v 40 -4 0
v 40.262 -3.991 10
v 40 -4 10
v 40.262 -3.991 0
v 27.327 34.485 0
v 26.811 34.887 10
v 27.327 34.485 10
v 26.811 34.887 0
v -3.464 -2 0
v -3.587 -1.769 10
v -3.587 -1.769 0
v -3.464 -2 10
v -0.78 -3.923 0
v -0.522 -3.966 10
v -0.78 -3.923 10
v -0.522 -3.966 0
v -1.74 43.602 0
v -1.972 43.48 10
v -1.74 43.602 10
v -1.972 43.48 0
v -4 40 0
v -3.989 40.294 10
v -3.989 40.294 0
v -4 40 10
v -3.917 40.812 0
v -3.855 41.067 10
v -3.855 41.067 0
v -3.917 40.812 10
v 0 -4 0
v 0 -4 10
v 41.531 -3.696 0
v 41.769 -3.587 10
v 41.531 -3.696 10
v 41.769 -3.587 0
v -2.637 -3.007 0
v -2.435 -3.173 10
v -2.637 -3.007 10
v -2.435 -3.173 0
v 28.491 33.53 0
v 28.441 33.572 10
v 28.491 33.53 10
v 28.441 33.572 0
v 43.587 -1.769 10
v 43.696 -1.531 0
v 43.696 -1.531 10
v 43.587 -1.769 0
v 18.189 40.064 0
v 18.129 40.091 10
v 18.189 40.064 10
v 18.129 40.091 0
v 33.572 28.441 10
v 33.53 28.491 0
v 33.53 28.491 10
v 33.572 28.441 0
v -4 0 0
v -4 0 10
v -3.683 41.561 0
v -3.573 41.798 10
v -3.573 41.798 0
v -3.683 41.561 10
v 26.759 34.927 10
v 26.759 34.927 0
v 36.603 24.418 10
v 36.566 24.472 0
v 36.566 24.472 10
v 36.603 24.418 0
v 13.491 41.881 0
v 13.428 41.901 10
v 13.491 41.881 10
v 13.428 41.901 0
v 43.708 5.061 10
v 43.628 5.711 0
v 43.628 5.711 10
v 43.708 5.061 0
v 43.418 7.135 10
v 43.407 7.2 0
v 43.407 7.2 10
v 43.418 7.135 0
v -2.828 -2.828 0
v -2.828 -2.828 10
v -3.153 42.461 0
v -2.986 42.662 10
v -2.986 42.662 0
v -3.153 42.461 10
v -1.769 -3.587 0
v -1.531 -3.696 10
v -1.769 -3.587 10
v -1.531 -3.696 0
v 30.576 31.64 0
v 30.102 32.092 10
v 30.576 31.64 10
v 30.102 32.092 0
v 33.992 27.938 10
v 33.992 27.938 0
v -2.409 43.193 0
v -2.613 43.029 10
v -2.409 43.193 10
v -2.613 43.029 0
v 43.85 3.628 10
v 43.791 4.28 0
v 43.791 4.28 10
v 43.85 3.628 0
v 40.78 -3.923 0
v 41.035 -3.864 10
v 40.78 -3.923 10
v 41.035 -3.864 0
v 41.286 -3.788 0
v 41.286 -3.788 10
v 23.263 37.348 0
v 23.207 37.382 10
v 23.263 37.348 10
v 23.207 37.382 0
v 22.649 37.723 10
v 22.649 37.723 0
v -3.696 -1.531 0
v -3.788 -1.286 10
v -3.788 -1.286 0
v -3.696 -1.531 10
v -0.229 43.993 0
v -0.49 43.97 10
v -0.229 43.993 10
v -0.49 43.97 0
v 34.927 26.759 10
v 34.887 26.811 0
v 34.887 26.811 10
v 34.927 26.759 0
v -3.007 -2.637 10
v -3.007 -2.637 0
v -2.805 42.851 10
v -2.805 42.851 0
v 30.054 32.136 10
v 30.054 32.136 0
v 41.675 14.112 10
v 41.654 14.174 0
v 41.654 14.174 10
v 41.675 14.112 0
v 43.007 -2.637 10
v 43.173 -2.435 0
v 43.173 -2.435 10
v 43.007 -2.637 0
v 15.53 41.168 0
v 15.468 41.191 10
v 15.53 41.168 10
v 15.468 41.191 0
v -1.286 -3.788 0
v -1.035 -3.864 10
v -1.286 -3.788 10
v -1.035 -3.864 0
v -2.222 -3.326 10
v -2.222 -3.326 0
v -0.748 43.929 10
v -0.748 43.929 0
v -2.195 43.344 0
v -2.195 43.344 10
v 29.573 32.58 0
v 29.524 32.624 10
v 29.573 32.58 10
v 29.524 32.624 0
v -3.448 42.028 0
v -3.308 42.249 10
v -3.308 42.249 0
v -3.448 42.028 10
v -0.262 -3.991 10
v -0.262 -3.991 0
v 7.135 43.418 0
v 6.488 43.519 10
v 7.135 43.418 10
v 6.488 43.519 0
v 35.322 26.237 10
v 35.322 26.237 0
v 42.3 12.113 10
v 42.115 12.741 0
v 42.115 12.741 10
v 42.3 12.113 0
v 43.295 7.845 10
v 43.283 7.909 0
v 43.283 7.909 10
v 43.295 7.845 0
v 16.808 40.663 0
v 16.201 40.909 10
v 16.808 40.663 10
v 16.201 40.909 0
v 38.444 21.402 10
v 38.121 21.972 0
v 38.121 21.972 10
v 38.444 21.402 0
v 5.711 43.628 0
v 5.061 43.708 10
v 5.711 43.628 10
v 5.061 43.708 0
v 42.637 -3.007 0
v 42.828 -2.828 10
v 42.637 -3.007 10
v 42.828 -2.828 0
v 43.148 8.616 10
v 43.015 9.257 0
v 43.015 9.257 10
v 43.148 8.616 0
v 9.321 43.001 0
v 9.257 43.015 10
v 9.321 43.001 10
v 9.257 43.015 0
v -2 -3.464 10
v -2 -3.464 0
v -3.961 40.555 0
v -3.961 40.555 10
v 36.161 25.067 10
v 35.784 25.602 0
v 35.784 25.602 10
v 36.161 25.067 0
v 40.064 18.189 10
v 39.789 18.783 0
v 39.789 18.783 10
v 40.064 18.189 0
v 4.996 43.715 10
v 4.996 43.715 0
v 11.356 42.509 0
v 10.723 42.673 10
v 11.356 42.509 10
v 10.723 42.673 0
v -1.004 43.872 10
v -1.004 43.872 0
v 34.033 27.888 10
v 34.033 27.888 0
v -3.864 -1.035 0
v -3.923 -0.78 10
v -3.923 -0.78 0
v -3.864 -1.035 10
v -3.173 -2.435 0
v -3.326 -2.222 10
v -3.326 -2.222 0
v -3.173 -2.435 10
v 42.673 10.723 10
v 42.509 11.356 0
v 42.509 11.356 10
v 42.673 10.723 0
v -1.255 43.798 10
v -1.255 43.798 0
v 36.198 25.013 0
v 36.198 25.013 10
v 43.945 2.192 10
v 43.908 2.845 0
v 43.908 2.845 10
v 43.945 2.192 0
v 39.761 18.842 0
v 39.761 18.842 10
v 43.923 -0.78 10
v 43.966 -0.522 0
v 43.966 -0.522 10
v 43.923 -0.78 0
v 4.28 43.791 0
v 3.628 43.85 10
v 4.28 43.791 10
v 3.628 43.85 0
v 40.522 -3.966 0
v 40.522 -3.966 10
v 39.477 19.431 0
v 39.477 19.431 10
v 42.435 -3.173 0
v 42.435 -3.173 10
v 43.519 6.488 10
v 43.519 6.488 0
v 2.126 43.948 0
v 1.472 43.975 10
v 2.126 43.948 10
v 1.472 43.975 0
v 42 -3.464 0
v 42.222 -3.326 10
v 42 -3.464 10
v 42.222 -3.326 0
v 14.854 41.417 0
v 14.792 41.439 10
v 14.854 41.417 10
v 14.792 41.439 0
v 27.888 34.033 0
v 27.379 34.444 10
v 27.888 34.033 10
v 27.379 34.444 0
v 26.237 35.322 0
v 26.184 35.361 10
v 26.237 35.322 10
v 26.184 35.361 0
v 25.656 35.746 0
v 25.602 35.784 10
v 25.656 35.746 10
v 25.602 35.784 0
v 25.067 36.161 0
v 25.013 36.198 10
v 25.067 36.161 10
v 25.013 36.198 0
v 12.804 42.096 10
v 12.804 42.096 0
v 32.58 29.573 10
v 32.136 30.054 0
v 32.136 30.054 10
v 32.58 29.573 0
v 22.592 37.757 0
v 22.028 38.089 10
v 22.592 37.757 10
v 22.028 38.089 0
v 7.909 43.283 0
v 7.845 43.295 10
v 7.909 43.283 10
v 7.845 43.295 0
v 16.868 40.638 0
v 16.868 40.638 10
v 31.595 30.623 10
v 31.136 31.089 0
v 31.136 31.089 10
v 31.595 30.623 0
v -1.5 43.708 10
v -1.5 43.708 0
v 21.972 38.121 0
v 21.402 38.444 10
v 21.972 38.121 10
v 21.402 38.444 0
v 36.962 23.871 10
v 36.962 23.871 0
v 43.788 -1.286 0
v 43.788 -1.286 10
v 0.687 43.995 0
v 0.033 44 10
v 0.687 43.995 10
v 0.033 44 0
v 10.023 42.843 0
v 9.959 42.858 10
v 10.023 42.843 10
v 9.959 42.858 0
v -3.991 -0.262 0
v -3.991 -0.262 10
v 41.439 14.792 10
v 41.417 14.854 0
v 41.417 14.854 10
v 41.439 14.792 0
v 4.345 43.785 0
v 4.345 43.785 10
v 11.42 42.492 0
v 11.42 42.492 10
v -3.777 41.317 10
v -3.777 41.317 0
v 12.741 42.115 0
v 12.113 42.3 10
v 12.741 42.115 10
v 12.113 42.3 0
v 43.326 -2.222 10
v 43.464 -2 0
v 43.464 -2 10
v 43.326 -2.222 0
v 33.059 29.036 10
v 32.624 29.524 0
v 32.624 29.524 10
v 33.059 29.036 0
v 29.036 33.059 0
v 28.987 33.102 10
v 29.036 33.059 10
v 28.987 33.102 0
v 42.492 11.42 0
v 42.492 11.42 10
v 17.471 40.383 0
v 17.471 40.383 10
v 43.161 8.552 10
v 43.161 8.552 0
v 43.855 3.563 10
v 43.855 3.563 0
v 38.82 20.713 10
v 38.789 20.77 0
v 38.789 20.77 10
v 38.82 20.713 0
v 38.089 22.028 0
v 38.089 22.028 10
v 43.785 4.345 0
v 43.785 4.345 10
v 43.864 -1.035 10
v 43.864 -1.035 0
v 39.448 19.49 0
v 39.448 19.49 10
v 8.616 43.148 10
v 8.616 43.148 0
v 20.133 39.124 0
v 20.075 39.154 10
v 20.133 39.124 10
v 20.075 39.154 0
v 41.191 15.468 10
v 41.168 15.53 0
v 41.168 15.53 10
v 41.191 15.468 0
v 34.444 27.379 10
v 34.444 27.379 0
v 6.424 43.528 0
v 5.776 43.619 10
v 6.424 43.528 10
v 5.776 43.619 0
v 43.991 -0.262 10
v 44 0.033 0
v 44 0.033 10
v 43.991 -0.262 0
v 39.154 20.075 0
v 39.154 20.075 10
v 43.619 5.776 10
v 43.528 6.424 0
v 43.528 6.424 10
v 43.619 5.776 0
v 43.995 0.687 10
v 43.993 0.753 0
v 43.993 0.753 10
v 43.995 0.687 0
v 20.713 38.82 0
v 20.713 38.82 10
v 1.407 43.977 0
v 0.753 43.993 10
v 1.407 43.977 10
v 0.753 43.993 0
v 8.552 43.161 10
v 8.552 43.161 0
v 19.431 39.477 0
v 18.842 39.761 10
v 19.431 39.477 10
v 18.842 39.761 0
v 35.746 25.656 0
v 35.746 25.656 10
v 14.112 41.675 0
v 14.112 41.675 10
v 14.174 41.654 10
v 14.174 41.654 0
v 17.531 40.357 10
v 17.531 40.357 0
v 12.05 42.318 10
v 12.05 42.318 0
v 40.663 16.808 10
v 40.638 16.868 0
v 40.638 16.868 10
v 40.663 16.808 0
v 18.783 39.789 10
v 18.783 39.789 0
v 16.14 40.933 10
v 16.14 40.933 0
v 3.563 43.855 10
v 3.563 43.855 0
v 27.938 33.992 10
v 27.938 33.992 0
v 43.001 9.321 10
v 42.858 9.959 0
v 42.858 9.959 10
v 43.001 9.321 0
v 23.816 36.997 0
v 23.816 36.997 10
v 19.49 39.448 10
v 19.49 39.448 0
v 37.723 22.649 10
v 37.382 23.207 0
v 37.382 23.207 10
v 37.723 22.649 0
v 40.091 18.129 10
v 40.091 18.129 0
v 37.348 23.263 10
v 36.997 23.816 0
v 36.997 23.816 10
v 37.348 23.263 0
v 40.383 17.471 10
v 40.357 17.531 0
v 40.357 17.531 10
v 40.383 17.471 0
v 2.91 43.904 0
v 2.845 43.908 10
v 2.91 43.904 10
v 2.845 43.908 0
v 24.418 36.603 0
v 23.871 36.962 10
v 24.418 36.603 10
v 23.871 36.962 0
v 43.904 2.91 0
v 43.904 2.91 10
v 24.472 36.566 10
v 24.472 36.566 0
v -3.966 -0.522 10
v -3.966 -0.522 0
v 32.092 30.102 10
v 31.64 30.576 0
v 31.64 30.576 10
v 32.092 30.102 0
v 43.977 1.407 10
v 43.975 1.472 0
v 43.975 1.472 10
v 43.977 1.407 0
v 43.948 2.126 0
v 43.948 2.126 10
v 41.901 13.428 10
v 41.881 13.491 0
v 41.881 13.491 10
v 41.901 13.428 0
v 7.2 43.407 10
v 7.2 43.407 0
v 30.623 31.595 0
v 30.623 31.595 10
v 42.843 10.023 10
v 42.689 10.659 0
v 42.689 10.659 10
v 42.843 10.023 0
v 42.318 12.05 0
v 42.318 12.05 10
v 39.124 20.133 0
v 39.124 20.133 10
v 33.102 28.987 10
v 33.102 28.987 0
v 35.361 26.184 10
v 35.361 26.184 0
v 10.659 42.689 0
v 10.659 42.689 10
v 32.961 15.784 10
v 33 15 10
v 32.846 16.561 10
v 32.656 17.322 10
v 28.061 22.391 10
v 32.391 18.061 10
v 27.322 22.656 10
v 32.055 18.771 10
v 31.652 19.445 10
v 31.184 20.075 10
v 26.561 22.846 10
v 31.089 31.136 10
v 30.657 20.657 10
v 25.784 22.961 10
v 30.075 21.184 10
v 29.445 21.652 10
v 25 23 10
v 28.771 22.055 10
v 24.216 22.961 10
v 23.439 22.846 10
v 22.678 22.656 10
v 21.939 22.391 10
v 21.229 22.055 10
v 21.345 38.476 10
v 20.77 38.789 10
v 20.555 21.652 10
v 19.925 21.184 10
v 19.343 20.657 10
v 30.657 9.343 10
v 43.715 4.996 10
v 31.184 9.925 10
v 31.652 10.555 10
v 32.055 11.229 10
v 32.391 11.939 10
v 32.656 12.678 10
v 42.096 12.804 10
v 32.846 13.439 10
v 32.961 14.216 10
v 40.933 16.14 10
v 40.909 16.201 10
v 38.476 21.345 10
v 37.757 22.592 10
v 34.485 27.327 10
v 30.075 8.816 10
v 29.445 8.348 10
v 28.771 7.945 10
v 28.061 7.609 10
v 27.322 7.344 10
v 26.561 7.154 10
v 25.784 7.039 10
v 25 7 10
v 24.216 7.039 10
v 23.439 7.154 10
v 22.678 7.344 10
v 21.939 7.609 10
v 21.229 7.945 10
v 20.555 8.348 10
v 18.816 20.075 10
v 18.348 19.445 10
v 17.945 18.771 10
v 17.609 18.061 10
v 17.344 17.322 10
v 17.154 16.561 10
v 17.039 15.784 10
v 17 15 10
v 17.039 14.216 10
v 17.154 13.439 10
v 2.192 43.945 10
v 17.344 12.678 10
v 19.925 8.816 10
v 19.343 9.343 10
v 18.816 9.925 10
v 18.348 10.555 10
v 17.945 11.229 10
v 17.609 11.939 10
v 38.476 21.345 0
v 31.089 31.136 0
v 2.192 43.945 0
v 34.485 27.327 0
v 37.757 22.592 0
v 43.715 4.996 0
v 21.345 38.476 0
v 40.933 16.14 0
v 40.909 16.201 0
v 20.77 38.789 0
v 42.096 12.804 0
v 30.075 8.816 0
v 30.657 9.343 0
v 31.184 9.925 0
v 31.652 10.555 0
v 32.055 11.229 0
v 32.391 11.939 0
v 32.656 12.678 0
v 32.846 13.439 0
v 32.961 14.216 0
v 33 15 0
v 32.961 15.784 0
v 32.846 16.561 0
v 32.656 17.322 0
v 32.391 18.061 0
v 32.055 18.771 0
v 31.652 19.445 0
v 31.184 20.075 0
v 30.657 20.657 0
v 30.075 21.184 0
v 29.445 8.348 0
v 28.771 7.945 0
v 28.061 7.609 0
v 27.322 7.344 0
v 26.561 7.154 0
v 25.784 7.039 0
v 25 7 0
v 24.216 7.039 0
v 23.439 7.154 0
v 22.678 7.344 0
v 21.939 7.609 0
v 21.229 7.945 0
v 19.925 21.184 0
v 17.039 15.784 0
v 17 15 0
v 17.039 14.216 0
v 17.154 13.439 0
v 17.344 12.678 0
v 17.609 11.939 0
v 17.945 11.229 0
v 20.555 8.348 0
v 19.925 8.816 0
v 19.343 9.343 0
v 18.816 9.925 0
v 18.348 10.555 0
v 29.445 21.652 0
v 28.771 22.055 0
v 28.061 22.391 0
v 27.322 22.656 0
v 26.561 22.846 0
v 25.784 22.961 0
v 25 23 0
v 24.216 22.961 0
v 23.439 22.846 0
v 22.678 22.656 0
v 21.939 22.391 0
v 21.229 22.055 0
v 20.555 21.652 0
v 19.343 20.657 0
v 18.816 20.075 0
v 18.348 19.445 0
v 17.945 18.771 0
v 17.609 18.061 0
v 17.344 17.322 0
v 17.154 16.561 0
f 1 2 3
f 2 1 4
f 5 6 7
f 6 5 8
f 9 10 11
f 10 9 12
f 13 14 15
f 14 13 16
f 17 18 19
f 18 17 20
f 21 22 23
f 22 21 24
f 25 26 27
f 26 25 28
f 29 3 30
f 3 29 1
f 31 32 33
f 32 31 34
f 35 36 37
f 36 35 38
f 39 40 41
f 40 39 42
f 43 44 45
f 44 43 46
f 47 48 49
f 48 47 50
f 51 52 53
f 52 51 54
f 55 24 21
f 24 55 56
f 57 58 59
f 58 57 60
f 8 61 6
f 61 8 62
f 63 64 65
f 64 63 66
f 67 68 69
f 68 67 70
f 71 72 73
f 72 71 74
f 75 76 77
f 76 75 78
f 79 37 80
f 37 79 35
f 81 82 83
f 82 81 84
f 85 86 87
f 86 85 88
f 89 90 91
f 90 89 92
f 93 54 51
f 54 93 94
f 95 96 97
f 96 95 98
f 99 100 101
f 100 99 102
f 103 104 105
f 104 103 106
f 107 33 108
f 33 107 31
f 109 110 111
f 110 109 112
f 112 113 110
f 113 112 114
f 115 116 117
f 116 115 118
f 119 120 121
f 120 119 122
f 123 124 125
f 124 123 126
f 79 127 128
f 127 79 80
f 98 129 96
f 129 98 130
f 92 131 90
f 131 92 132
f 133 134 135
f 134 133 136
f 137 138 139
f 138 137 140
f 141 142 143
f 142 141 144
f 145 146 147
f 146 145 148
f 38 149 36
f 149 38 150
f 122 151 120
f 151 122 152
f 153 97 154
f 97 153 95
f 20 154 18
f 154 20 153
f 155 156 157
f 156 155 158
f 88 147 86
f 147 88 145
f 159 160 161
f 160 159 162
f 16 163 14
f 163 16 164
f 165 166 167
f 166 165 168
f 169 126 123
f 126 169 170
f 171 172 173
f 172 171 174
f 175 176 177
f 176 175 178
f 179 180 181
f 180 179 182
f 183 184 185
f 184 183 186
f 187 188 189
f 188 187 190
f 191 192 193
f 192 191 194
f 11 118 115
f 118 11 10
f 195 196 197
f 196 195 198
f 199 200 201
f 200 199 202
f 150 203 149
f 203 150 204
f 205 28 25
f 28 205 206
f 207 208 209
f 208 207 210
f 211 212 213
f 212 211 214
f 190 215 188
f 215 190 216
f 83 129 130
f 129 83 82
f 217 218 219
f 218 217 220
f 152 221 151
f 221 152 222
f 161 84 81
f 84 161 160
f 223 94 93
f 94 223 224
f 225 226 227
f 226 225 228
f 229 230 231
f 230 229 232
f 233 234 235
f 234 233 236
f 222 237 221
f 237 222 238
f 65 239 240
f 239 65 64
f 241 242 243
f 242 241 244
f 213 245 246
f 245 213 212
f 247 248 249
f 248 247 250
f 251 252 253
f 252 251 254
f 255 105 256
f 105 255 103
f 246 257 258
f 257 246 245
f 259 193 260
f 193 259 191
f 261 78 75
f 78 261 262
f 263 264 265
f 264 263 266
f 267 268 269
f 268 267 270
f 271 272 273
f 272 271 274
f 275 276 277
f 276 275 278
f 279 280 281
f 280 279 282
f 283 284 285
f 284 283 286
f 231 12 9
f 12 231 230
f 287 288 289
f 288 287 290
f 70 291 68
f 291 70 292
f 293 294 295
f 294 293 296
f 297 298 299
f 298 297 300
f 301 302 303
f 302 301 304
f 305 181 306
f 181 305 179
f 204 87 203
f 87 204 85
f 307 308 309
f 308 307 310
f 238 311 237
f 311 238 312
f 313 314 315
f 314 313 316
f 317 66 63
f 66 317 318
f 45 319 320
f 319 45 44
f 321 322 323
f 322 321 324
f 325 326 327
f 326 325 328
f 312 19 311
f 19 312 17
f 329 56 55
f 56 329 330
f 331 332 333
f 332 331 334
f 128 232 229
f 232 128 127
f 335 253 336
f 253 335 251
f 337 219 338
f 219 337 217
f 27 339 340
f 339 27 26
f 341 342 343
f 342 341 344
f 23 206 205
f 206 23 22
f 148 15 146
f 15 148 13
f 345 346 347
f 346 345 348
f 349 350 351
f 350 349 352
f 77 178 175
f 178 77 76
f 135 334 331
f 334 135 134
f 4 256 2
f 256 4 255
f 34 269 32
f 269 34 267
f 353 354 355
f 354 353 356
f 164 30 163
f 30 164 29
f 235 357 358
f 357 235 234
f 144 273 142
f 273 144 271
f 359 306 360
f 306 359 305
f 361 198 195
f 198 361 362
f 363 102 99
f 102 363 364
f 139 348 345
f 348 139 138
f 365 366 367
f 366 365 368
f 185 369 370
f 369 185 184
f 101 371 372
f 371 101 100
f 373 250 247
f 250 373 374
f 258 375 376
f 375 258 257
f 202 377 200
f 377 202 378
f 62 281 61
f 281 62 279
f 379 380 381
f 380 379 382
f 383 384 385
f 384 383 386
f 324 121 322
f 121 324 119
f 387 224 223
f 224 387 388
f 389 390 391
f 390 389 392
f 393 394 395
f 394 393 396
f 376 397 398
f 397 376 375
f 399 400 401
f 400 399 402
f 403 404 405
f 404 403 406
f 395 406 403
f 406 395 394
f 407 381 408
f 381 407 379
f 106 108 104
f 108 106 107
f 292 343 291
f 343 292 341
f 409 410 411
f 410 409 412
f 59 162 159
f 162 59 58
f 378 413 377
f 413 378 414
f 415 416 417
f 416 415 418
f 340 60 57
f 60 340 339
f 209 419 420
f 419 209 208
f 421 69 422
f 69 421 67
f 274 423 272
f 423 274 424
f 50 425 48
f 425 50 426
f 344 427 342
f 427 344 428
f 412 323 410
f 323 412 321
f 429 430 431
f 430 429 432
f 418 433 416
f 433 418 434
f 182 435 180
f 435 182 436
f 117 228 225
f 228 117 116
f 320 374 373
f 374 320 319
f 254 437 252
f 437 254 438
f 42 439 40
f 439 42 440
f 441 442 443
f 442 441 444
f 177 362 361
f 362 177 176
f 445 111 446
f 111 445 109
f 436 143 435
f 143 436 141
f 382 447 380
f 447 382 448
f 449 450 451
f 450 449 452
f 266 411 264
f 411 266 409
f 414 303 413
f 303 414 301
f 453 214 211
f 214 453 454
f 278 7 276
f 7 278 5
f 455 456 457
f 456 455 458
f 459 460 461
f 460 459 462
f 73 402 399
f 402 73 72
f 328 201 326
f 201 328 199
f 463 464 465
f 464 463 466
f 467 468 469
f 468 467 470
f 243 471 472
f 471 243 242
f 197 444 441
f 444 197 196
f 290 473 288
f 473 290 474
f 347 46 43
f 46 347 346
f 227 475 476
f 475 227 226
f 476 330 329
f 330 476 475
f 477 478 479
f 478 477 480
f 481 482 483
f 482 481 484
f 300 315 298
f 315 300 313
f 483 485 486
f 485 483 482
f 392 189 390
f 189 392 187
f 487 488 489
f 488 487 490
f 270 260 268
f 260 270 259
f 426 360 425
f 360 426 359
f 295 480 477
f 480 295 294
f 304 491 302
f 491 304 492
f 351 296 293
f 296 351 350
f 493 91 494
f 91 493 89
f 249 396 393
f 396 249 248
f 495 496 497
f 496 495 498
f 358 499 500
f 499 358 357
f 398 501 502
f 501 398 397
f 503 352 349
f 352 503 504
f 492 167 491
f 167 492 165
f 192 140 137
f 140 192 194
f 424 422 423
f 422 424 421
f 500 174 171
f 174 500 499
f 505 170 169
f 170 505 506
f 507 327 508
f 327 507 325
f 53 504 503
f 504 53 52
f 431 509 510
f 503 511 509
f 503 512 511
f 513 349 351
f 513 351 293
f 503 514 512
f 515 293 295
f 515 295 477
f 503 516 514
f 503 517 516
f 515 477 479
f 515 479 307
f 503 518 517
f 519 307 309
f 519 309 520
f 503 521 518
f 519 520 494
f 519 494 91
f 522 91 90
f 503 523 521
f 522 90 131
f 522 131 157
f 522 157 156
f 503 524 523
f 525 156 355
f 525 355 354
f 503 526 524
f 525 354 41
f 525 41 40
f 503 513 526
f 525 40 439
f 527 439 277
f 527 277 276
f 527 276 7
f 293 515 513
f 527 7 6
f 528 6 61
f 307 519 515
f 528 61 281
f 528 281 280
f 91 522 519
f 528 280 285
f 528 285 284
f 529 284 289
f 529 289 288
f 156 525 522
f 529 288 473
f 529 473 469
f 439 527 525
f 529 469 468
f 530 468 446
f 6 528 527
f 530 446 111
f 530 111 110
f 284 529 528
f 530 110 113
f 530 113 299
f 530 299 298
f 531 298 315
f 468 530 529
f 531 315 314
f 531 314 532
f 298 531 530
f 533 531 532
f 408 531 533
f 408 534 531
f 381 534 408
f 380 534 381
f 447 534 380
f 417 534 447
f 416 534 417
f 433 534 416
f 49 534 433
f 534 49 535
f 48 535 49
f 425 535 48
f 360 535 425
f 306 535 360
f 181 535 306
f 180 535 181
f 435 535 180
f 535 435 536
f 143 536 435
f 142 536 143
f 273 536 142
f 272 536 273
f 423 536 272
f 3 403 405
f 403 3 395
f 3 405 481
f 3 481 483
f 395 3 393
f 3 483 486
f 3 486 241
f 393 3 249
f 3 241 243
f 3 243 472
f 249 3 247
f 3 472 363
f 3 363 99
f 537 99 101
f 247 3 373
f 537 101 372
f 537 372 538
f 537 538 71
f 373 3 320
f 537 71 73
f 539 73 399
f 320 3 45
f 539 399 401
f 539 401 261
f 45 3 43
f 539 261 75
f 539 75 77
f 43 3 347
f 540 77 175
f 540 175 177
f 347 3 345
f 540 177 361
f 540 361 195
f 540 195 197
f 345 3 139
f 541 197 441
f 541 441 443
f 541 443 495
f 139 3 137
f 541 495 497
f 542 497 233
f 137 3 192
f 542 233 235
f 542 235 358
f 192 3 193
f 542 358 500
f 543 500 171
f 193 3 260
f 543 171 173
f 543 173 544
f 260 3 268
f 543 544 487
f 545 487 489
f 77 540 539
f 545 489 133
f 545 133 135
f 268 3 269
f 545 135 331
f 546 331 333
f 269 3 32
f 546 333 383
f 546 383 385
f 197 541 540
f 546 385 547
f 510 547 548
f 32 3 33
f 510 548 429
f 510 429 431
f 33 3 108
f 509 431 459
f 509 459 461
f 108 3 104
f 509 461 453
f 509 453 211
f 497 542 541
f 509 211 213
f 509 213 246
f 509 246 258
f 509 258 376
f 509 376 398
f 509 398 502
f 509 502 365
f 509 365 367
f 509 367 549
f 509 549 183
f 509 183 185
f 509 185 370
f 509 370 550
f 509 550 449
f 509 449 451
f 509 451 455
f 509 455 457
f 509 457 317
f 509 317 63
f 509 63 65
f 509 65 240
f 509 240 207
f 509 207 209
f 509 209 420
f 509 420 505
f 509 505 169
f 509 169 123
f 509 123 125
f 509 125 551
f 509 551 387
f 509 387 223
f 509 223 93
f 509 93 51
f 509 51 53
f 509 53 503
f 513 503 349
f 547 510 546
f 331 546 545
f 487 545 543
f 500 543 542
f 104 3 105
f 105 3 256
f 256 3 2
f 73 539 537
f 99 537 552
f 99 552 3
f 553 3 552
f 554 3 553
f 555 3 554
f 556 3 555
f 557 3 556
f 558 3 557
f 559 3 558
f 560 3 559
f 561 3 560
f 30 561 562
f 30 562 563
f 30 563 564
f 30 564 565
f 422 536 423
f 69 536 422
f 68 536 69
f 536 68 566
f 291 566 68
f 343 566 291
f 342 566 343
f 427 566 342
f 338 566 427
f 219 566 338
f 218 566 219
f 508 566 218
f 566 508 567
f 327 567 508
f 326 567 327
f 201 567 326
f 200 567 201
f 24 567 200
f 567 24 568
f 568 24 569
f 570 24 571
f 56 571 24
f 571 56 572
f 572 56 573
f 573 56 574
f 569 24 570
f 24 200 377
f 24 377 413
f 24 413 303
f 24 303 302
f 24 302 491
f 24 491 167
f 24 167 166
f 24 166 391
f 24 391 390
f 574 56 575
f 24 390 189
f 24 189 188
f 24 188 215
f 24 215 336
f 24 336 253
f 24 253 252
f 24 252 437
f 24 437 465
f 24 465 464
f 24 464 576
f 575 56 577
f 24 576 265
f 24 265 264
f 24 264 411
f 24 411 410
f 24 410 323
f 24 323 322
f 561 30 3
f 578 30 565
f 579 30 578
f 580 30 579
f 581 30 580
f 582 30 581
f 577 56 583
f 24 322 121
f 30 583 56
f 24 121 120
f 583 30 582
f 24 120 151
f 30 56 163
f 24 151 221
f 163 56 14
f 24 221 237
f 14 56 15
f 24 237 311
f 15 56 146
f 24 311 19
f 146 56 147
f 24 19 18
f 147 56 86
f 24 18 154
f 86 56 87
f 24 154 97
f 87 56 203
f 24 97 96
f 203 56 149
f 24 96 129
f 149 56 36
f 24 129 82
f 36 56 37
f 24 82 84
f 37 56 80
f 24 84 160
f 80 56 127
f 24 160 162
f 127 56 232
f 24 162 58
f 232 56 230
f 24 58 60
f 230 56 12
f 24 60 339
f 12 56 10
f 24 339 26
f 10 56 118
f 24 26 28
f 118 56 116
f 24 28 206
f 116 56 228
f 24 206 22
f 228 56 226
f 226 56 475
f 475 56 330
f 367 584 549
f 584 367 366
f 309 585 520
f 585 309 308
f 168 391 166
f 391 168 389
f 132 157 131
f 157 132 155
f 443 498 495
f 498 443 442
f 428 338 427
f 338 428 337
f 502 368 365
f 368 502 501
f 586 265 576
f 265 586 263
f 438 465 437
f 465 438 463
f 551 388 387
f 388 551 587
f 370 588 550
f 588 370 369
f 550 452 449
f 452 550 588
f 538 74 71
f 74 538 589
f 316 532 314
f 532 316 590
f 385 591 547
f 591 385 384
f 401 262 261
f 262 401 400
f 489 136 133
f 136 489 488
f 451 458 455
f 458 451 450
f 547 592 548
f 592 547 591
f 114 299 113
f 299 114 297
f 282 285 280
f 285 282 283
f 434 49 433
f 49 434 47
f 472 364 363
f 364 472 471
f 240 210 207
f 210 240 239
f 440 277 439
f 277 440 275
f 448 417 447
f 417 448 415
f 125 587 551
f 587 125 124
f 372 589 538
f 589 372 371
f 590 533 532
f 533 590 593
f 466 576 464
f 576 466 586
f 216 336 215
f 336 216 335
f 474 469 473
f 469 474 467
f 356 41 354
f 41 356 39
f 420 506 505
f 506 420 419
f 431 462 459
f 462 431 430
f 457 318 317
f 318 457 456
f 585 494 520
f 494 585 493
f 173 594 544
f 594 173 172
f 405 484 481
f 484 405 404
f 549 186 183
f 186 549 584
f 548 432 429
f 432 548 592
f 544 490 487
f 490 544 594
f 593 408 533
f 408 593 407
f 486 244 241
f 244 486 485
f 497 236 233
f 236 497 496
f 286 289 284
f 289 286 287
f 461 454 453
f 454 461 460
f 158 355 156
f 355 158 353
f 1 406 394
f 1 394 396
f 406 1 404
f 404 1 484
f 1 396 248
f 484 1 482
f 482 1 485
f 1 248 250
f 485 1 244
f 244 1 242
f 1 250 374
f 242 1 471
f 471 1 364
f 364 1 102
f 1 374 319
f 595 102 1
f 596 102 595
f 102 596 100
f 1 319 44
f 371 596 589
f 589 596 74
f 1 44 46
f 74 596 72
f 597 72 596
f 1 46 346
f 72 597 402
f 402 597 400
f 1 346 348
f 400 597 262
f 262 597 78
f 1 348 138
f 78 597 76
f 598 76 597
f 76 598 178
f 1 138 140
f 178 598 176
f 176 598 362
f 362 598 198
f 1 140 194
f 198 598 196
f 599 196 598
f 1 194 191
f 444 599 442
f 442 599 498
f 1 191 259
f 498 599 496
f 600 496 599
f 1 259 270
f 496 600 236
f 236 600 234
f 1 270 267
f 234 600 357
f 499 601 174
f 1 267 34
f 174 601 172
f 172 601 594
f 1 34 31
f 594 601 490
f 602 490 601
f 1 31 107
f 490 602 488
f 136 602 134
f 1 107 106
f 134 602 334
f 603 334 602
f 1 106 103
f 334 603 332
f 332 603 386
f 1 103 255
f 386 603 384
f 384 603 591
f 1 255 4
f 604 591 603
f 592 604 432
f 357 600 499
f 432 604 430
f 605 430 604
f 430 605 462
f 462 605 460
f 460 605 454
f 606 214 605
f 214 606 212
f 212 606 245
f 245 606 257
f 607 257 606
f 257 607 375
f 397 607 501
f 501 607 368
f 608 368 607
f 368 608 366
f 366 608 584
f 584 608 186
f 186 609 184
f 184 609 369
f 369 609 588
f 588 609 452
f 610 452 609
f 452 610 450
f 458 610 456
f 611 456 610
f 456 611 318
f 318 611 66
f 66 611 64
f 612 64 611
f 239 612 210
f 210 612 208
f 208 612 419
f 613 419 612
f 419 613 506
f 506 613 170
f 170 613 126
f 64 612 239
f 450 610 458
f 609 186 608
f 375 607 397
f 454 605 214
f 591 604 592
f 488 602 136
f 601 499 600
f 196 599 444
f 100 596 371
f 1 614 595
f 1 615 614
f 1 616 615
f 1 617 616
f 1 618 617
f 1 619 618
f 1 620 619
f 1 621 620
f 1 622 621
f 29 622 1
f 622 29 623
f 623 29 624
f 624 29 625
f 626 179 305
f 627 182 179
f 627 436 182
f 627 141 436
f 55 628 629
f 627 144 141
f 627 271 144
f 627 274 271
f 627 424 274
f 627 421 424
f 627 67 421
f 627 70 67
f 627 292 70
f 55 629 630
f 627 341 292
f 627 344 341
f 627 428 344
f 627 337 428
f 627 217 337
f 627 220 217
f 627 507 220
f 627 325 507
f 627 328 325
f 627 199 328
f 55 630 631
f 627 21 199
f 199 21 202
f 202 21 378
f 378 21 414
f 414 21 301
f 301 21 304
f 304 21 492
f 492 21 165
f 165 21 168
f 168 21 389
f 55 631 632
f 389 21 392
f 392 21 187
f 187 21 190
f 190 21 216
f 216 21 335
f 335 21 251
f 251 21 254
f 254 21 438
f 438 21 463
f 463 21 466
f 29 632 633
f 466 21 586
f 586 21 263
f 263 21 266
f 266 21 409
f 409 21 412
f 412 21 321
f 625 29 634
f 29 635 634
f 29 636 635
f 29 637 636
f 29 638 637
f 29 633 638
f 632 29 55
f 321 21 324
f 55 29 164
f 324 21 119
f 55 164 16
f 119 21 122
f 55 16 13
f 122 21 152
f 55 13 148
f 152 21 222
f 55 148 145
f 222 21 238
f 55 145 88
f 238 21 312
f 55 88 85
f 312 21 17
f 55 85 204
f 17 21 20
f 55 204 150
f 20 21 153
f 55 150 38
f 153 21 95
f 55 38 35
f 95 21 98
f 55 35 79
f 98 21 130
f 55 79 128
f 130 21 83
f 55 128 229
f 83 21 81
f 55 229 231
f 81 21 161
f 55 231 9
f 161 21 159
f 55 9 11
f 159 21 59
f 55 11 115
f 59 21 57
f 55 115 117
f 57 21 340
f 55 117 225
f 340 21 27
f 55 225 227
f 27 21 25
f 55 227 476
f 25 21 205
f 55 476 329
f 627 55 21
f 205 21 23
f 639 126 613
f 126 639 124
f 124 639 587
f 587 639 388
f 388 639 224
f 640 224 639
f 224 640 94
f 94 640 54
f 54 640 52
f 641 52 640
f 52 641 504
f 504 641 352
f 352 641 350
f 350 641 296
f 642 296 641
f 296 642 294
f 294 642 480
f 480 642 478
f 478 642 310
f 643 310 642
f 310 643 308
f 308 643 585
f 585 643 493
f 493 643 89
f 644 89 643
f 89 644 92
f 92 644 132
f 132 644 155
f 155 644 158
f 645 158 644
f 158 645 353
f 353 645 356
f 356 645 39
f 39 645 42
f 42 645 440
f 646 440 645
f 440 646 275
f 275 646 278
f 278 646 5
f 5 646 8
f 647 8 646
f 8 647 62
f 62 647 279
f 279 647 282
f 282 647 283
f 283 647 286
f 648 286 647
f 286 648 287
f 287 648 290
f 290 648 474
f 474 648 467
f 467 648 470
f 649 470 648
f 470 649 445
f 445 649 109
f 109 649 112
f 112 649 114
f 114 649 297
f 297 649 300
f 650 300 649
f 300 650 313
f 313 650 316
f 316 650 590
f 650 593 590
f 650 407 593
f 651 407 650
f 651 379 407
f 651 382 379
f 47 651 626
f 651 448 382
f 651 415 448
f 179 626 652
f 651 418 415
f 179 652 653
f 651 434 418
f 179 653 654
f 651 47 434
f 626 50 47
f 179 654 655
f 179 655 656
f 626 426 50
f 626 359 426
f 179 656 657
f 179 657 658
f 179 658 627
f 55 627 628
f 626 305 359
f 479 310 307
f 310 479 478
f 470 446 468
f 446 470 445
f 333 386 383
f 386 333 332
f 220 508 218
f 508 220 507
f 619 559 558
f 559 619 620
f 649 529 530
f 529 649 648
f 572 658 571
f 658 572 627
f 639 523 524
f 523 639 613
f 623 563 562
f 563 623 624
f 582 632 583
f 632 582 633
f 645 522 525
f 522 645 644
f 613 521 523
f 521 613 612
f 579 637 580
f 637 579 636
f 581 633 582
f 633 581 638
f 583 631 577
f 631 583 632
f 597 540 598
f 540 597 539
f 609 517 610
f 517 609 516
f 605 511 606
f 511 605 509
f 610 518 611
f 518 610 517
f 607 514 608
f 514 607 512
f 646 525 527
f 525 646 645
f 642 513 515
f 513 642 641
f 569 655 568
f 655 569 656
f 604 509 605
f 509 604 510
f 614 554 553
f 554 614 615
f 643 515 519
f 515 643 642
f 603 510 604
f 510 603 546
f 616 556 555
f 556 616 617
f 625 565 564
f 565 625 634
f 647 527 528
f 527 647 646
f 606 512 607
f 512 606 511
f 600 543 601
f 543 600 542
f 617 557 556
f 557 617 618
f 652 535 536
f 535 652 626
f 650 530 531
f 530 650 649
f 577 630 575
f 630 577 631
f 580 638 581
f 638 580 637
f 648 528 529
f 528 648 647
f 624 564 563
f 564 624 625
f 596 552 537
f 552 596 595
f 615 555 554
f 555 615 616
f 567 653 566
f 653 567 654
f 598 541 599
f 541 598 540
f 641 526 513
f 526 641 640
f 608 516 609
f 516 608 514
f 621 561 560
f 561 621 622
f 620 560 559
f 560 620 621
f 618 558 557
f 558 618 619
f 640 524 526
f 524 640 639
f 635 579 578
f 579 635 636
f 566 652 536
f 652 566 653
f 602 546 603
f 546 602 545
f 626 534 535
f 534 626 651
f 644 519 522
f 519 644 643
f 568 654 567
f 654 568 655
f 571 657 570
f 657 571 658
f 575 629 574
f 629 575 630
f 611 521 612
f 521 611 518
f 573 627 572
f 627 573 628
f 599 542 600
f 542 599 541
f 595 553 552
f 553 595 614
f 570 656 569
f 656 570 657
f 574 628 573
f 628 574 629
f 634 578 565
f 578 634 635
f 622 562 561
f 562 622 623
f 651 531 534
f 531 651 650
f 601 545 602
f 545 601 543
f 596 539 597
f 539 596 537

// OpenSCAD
// PARAMETERS
radius = 40;
height = 10;
rounding = 4;   // Corner rounding
$fn = 96;       // Smoothness
hole_radius = 8; // Radius of the drilled hole
hole_x = 25;    // X position of hole center
hole_y = 15;    // Y position of hole center

// Helper for arc points
function pie_arc_points(r, angle=90, n=32) = 
    [for(i=[0:n]) let(a=angle*i/n) [r*cos(a), r*sin(a)]];

// Pie wedge points
pie_pts = concat([[0,0]], pie_arc_points(radius, 90, $fn), [[0,0]]);

difference() {
    // The rounded quarter-pie
    linear_extrude(height=height)
        offset(r=rounding)
            polygon(points=pie_pts);

    // The "drilled" hole (vertical cylinder)
    translate([hole_x, hole_y, -1]) // -1 to guarantee it cuts all the way
        cylinder(r=hole_radius, h=height+2, $fn=64); // $fn=64 = smooth
}
